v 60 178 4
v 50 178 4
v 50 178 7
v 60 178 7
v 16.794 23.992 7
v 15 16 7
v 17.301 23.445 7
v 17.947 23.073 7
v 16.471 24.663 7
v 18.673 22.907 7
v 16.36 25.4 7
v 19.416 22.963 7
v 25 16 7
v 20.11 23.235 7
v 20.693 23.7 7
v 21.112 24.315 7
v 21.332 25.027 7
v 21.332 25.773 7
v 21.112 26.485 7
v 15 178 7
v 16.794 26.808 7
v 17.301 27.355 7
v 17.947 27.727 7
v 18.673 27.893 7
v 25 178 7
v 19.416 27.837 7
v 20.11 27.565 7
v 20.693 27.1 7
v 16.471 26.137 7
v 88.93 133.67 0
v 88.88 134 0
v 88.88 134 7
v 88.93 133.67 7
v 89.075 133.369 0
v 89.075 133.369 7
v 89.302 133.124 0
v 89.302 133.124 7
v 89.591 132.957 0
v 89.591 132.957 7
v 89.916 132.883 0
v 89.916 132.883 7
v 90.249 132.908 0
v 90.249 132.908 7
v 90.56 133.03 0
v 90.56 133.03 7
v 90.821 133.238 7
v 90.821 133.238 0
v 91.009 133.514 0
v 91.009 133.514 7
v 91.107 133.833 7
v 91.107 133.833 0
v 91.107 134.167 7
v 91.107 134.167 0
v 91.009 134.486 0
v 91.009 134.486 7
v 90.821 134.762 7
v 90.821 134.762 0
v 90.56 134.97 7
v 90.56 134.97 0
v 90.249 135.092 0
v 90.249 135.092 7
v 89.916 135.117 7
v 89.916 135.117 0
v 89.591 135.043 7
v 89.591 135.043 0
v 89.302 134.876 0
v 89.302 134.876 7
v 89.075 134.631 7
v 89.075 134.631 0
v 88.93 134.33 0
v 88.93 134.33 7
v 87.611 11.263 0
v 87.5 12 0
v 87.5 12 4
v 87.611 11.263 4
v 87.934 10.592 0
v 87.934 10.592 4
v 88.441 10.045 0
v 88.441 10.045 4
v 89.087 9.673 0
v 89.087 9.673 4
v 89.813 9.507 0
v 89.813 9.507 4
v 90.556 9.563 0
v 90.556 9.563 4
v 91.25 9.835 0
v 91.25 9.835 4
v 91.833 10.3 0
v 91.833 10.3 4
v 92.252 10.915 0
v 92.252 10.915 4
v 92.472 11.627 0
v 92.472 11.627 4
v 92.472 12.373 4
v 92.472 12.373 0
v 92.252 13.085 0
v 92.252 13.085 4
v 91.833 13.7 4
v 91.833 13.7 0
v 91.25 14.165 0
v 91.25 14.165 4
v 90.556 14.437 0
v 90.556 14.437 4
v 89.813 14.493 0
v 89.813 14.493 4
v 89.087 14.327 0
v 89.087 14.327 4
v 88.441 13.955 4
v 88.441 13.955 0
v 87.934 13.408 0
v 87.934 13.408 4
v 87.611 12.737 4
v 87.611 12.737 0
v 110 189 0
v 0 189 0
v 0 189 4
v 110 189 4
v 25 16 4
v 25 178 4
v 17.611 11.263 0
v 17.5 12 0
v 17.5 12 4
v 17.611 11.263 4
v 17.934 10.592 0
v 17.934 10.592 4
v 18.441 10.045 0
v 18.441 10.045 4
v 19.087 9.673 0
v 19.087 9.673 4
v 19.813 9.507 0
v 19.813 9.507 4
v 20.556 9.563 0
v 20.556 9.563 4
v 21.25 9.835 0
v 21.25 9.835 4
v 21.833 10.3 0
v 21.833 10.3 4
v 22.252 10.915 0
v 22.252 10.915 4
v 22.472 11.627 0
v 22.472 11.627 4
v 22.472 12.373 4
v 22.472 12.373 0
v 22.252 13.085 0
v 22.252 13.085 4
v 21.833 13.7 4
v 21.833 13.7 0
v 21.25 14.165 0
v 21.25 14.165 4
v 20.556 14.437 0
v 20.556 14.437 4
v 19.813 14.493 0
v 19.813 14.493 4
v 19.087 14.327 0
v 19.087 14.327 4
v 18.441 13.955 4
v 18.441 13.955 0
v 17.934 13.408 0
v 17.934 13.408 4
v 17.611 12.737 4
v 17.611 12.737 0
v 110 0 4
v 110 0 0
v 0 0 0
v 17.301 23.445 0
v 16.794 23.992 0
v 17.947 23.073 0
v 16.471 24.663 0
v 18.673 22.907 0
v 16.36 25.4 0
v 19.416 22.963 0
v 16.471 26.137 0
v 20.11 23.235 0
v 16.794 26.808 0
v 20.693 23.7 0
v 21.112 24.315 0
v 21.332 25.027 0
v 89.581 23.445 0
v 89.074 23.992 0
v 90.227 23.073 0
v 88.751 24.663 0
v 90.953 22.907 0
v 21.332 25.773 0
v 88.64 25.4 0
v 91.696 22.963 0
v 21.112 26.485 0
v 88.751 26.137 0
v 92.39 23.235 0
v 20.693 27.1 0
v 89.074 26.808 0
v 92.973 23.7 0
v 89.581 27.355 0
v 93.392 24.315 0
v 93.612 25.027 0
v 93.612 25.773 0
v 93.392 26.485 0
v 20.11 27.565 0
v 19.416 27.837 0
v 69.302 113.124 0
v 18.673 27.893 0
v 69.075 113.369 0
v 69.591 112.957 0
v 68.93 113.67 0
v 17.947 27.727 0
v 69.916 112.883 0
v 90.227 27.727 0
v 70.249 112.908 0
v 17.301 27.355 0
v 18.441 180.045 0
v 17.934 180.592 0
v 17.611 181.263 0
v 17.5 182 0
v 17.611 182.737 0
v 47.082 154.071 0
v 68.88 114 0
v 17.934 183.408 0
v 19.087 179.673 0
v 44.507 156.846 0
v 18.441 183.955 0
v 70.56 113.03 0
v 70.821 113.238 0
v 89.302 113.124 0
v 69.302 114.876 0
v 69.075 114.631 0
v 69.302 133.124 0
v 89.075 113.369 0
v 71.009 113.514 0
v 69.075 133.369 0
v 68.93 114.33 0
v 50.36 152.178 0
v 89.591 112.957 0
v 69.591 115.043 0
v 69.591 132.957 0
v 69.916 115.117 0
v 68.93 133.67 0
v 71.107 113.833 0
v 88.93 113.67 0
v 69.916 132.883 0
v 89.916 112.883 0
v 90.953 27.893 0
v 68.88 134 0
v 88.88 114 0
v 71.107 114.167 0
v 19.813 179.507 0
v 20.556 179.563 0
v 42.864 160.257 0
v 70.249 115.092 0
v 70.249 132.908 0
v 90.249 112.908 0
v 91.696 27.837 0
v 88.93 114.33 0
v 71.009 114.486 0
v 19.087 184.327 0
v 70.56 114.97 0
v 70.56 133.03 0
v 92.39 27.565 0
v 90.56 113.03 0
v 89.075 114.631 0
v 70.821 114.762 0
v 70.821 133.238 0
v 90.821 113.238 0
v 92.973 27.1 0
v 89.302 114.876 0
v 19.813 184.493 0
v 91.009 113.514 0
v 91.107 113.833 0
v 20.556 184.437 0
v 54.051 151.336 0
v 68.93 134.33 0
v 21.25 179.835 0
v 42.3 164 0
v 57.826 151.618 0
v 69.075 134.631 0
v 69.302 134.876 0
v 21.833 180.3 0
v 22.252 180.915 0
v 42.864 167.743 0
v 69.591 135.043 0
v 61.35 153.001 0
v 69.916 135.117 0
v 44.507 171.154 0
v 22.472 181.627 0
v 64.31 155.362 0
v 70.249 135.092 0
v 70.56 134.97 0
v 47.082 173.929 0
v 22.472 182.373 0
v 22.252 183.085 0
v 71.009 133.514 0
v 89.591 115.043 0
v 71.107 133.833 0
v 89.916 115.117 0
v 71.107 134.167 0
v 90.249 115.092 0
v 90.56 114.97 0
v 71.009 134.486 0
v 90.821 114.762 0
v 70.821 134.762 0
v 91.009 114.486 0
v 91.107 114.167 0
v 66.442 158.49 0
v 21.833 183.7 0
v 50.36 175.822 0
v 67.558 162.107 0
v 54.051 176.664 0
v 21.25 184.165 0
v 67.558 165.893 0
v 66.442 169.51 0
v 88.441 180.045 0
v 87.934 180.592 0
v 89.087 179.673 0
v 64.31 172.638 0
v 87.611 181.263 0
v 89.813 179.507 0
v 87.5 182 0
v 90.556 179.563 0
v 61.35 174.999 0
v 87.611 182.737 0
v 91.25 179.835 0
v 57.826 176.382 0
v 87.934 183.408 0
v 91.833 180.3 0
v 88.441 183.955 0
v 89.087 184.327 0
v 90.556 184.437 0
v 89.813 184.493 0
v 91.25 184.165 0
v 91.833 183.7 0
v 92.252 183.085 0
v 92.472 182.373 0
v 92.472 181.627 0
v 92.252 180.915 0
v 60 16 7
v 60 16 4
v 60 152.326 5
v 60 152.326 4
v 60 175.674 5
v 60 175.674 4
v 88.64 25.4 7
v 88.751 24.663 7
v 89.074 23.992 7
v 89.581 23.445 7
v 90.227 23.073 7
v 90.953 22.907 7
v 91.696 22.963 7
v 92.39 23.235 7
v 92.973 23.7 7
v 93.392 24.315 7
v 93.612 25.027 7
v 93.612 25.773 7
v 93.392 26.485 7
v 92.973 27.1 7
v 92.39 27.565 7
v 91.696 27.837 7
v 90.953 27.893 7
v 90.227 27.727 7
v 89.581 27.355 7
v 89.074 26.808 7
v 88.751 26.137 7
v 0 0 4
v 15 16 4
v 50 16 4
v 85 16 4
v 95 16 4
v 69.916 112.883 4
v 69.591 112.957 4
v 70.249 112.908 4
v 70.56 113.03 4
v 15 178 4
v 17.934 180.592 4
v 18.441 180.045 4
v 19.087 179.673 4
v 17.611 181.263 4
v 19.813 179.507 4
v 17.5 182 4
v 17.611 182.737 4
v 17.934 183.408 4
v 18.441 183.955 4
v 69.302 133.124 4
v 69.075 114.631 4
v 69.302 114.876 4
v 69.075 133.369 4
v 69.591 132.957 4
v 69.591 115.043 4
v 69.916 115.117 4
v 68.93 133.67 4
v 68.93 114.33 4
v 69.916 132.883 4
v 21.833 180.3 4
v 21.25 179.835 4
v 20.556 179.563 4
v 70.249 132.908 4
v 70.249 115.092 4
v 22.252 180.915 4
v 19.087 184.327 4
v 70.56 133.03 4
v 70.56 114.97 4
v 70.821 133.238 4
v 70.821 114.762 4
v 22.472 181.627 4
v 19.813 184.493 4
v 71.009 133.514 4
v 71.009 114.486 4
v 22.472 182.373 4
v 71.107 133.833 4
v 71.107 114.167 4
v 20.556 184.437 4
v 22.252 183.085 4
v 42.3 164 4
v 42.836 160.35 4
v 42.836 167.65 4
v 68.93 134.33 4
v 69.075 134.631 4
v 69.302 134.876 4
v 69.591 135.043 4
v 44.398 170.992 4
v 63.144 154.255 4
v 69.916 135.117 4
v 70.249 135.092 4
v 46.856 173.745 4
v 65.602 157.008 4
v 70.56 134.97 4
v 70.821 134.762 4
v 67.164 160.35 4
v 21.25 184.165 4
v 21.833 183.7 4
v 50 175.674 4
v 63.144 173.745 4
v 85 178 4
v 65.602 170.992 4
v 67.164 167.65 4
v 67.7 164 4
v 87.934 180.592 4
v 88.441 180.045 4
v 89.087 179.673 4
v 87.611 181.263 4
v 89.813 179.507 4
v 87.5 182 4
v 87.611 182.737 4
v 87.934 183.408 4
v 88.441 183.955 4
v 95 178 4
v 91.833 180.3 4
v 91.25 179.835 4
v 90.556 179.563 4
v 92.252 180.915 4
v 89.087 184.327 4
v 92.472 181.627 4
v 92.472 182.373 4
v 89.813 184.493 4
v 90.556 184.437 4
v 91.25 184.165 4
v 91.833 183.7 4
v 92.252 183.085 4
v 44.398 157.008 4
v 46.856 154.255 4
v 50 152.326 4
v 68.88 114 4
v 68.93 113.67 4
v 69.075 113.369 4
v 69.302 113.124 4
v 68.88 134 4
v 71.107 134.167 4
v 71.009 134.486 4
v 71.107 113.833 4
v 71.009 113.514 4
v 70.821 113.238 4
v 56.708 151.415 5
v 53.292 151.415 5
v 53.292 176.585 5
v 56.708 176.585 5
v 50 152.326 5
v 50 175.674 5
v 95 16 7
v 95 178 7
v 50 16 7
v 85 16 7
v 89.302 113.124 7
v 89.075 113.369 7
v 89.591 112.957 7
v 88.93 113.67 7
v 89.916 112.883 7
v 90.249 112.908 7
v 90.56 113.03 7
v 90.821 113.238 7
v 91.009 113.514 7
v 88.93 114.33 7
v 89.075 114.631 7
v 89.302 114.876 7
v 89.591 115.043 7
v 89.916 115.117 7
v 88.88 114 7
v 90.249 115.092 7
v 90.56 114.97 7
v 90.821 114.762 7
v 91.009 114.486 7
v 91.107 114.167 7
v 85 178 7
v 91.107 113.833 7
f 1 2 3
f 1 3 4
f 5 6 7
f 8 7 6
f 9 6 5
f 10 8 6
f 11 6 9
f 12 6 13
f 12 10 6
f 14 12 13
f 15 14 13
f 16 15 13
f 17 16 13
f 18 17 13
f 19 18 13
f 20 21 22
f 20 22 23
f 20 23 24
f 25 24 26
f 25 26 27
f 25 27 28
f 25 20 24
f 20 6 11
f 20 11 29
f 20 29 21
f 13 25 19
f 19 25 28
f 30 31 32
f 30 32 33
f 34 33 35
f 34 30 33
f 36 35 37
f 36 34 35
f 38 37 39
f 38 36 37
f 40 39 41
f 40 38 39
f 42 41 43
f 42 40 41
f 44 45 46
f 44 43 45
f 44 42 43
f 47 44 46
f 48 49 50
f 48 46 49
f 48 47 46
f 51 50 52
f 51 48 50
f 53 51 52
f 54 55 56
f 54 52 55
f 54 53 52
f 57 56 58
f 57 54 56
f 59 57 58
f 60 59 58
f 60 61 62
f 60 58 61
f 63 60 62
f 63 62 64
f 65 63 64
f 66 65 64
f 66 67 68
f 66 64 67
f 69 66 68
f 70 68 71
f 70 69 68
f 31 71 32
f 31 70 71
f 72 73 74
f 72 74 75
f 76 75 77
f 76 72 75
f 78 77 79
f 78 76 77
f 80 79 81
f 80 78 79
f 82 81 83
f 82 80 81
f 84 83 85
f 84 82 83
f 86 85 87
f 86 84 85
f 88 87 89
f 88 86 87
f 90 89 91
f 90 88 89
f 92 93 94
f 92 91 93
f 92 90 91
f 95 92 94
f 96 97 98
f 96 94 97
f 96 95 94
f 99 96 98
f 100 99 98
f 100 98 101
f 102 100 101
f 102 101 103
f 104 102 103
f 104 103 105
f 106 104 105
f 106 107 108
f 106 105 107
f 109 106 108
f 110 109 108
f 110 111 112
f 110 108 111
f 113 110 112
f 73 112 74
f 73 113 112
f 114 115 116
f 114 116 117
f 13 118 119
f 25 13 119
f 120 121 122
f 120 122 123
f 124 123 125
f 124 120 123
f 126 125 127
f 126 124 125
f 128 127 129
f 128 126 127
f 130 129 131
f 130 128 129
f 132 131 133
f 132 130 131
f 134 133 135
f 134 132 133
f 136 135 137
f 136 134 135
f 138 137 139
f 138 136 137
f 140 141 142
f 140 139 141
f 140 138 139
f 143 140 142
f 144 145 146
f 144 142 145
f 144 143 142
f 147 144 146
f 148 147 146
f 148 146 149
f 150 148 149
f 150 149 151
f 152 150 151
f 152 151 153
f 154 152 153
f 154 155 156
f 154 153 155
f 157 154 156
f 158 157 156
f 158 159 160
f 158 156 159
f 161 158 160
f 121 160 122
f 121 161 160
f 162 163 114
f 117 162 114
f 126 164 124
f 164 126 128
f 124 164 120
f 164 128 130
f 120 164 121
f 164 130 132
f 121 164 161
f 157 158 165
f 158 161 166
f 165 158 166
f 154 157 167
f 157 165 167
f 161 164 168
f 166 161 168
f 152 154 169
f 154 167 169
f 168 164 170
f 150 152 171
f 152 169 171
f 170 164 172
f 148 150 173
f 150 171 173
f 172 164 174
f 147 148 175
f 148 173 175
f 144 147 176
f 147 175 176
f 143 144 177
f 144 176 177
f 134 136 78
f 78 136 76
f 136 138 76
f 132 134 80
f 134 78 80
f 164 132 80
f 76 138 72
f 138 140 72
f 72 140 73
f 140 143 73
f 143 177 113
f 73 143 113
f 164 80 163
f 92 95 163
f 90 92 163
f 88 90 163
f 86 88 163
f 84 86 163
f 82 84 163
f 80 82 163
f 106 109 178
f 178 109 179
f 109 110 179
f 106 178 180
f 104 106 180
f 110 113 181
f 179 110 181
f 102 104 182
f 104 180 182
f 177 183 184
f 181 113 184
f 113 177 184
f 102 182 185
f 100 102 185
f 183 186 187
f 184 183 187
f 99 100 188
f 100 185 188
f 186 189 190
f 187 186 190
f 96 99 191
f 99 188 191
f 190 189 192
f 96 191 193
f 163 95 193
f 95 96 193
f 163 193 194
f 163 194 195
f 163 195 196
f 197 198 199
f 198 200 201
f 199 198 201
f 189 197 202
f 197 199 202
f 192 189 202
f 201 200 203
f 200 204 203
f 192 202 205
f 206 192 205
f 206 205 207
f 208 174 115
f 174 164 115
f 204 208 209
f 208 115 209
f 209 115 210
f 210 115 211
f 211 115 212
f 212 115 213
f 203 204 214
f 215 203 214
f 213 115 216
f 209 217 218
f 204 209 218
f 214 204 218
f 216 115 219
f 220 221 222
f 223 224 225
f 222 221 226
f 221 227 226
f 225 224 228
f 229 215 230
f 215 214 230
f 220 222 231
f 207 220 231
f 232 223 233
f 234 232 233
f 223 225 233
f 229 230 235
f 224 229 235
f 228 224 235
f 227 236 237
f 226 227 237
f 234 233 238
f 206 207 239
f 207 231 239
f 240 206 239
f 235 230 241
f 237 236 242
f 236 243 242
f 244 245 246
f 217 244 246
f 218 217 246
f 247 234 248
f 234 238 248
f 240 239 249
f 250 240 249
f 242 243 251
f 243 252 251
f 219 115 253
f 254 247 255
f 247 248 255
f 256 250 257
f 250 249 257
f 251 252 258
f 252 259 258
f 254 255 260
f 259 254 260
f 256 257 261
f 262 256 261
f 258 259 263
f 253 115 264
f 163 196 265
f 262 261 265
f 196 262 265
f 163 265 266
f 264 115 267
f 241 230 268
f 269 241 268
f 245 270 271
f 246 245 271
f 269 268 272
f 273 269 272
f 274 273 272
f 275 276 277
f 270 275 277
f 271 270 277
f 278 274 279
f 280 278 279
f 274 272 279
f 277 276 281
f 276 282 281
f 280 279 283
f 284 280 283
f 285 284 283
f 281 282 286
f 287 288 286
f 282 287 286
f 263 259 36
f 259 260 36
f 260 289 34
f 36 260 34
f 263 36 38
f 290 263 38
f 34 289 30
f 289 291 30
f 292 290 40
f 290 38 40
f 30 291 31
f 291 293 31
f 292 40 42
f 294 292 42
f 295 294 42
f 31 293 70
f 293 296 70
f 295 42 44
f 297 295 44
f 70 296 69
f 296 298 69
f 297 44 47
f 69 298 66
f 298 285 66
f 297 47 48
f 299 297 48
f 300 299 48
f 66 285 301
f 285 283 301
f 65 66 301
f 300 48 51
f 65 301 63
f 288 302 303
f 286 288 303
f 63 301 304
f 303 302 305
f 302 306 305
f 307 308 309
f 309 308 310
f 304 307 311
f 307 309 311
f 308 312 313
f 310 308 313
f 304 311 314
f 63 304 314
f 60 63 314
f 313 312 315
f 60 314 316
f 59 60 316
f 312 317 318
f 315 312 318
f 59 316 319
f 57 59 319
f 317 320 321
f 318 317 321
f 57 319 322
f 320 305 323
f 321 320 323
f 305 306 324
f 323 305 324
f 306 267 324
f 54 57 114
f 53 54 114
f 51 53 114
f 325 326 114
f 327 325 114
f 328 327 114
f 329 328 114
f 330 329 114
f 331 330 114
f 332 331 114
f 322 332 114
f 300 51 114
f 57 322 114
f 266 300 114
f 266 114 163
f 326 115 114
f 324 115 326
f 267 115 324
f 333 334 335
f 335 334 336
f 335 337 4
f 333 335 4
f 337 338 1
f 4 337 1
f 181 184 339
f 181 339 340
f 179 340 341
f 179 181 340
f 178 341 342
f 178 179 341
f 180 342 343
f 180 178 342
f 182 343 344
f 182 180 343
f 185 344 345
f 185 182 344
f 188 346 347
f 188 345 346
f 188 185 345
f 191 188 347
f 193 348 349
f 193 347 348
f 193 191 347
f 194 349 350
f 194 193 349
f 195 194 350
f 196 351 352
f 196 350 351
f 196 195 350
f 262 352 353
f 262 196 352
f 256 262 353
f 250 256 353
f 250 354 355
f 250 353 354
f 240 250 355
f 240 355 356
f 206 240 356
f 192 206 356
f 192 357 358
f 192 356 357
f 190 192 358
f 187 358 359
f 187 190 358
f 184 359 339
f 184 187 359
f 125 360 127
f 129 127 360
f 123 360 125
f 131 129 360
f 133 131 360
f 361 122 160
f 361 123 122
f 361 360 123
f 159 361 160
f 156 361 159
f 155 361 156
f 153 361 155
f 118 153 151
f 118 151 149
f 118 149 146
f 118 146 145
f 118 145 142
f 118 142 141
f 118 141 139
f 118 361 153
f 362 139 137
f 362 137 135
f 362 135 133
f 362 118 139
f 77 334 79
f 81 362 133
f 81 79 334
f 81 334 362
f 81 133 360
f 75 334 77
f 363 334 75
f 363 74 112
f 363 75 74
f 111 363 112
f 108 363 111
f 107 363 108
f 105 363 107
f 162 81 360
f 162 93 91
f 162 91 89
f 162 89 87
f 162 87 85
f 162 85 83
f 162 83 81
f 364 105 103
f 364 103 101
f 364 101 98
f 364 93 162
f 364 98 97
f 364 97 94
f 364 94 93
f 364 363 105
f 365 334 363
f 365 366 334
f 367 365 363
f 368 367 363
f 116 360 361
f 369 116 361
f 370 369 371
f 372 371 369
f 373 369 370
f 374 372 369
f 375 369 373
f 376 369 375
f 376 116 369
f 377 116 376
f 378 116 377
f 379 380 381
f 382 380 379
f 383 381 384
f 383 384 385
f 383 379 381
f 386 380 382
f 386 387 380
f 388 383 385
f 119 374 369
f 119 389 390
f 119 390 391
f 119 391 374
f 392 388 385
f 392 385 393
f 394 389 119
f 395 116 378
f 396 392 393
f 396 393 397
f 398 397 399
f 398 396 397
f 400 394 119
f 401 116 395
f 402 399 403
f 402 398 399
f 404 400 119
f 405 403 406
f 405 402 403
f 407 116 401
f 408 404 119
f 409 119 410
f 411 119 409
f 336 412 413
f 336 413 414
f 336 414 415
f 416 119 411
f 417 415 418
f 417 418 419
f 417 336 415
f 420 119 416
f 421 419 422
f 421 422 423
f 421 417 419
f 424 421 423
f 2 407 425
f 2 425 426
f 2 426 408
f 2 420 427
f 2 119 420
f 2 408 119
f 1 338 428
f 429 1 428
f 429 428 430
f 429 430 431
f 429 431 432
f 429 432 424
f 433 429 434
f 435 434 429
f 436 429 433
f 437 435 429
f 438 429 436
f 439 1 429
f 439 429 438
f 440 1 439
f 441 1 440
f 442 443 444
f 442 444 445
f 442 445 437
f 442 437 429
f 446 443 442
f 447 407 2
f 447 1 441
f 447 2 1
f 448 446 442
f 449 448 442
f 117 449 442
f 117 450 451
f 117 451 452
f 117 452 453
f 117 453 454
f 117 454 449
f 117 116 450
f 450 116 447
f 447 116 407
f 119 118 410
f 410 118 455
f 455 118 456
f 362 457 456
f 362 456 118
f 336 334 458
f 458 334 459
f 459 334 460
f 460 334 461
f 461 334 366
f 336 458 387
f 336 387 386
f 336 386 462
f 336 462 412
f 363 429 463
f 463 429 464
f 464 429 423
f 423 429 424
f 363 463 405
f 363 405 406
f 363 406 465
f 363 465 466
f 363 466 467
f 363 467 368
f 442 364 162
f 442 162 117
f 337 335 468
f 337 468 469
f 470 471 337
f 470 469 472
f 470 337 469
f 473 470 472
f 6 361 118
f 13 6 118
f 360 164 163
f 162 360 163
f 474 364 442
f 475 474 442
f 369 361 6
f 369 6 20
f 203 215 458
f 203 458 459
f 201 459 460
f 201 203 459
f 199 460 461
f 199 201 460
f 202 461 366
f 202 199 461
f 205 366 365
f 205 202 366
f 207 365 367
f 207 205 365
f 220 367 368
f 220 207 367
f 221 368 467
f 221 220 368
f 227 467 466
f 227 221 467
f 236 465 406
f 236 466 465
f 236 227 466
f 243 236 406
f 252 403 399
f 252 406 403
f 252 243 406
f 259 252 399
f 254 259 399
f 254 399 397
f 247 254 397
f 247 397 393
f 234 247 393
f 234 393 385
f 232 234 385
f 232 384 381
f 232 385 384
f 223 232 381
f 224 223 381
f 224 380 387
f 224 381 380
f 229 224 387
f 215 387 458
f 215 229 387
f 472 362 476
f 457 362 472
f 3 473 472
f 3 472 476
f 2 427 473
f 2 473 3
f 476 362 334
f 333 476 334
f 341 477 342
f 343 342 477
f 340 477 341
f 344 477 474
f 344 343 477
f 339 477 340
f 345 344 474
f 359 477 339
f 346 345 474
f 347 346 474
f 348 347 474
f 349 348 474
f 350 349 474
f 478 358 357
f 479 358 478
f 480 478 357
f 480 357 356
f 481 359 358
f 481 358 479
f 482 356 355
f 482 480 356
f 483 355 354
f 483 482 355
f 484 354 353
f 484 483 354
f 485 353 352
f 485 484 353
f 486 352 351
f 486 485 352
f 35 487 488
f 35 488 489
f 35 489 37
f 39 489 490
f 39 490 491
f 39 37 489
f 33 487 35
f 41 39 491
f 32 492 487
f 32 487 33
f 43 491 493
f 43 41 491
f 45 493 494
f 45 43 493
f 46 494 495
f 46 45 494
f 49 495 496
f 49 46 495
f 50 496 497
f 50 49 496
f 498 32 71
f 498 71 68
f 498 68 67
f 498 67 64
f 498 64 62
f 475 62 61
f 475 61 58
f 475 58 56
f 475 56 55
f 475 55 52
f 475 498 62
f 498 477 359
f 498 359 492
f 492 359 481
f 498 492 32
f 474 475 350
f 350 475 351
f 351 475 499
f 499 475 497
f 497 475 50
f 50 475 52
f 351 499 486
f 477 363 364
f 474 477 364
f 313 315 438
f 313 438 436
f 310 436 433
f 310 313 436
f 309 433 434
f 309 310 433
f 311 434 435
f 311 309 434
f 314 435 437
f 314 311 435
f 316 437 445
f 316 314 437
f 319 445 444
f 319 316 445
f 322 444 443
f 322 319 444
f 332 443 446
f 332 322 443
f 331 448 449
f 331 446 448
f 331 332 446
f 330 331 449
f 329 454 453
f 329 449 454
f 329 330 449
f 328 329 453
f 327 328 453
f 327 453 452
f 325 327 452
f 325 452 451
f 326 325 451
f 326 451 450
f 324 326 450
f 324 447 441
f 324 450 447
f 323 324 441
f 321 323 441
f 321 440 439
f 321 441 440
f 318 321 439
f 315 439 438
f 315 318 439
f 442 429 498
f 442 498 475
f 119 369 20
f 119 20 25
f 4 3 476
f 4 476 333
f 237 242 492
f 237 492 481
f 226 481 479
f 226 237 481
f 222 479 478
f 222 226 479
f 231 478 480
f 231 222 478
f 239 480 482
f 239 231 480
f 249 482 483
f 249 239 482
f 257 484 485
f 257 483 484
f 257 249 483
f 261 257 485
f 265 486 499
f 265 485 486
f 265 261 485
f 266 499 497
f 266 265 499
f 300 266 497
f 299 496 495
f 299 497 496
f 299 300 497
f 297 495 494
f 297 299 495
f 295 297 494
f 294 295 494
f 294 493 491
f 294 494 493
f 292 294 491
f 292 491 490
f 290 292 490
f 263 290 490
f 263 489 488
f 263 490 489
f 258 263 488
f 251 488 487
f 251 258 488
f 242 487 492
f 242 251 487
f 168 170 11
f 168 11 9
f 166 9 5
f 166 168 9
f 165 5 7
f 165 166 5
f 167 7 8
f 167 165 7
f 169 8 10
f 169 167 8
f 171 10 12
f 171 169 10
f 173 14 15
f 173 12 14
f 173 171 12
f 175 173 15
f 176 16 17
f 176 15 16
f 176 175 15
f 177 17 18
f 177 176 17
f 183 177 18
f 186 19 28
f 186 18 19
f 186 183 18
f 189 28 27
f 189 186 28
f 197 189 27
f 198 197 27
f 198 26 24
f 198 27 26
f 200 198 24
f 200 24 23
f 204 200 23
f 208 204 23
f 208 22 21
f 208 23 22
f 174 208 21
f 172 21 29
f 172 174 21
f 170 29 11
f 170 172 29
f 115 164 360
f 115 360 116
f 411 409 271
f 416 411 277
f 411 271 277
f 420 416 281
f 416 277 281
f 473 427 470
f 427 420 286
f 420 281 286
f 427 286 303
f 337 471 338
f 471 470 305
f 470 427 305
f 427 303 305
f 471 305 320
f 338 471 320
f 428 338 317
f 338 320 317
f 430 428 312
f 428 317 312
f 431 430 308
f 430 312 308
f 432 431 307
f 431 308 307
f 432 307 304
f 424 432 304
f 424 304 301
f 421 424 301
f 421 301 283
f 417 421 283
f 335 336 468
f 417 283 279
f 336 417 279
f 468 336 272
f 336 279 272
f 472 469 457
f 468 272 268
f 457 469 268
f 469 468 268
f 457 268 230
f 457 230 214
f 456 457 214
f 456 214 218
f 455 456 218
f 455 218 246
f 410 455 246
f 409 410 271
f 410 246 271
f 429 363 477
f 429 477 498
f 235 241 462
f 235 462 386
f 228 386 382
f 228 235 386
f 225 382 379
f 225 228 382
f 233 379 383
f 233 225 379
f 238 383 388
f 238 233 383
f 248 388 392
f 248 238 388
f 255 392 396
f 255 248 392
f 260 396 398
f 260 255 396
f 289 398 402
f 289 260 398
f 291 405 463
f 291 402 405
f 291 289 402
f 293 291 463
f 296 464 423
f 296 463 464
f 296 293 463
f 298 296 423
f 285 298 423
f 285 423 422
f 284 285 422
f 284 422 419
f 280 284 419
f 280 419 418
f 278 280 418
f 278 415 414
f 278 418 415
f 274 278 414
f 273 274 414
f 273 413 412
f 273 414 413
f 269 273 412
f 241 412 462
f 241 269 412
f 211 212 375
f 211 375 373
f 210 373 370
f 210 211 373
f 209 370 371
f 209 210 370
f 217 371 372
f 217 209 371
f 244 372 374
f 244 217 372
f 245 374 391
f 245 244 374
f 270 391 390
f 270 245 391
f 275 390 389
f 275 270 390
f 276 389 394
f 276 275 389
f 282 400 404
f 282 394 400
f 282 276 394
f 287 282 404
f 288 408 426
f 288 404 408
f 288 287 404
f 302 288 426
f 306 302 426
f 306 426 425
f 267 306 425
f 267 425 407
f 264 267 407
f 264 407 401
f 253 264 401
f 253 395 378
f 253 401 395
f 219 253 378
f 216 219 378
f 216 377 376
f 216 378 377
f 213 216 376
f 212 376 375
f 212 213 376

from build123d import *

# Parameters (mm, degrees)
SKETCH1_W               = 110
SKETCH1_H               = 189
BOSS_EXTRUDE1_DEPTH     = 4
SKETCH3_W               = 10
SKETCH3_H               = 162
BOSS_EXTRUDE2_DEPTH     = 3
CUT_EXTRUDE1_DEPTH      = 5
CUT_EXTRUDE1_DEPTH_BACK = 146
SKETCH2_R               = 2.5
SKETCH2_R_2             = 1.12
SKETCH4_R               = 12.7
CUT_EXTRUDE2_DEPTH      = 5


with BuildPart() as part:
    # Sketch1 → Boss-Extrude1 (new body)
    with BuildSketch(Plane.XY):
        with Locations((55, 94.5)):
            Rectangle(SKETCH1_W, SKETCH1_H)
    extrude(amount=BOSS_EXTRUDE1_DEPTH)

    # Sketch3 → Boss-Extrude2 (add)
    with BuildSketch(Plane.XY.offset(4)):
        with Locations((55, 97)):
            Rectangle(SKETCH3_W, SKETCH3_H)
        with Locations((20, 97)):
            Rectangle(SKETCH3_W, SKETCH3_H)
        with Locations((90, 97)):
            Rectangle(SKETCH3_W, SKETCH3_H)
    extrude(amount=BOSS_EXTRUDE2_DEPTH)

    # Sketch2 → Cut-Extrude1 (cut, two sides: drawn at the far end of the back side and taken through both)
    with BuildSketch(Plane.XY.offset(4).offset(-CUT_EXTRUDE1_DEPTH_BACK)):
        with Locations(Location((20, 12, 0), (0, 0, 180))):
            Circle(SKETCH2_R)
        with Locations(Location((90, 12, 0), (0, 0, 180))):
            Circle(SKETCH2_R)
        with Locations(Location((18.86, 25.4, 0), (0, 0, 180))):
            Circle(SKETCH2_R)
        with Locations(Location((91.14, 25.4, 0), (0, 0, 180))):
            Circle(SKETCH2_R)
        with Locations(Location((20, 182, 0), (0, 0, 180))):
            Circle(SKETCH2_R)
        with Locations(Location((90, 182, 0), (0, 0, 180))):
            Circle(SKETCH2_R)
        with Locations(Location((70, 134, 0), (0, 0, 180))):
            Circle(SKETCH2_R_2)
        with Locations(Location((90, 134, 0), (0, 0, 180))):
            Circle(SKETCH2_R_2)
        with Locations(Location((90, 114, 0), (0, 0, 180))):
            Circle(SKETCH2_R_2)
        with Locations(Location((70, 114, 0), (0, 0, 180))):
            Circle(SKETCH2_R_2)
    extrude(amount=CUT_EXTRUDE1_DEPTH + CUT_EXTRUDE1_DEPTH_BACK, mode=Mode.SUBTRACT)

    # Sketch4 → Cut-Extrude2 (cut)
    with BuildSketch(Plane(origin=(0, 0, 0), x_dir=(-1, 0, 0), z_dir=(0, 0, -1))):
        with Locations((-55, 164)):
            Circle(SKETCH4_R)
    extrude(amount=-CUT_EXTRUDE2_DEPTH, mode=Mode.SUBTRACT)


solid = part.part
